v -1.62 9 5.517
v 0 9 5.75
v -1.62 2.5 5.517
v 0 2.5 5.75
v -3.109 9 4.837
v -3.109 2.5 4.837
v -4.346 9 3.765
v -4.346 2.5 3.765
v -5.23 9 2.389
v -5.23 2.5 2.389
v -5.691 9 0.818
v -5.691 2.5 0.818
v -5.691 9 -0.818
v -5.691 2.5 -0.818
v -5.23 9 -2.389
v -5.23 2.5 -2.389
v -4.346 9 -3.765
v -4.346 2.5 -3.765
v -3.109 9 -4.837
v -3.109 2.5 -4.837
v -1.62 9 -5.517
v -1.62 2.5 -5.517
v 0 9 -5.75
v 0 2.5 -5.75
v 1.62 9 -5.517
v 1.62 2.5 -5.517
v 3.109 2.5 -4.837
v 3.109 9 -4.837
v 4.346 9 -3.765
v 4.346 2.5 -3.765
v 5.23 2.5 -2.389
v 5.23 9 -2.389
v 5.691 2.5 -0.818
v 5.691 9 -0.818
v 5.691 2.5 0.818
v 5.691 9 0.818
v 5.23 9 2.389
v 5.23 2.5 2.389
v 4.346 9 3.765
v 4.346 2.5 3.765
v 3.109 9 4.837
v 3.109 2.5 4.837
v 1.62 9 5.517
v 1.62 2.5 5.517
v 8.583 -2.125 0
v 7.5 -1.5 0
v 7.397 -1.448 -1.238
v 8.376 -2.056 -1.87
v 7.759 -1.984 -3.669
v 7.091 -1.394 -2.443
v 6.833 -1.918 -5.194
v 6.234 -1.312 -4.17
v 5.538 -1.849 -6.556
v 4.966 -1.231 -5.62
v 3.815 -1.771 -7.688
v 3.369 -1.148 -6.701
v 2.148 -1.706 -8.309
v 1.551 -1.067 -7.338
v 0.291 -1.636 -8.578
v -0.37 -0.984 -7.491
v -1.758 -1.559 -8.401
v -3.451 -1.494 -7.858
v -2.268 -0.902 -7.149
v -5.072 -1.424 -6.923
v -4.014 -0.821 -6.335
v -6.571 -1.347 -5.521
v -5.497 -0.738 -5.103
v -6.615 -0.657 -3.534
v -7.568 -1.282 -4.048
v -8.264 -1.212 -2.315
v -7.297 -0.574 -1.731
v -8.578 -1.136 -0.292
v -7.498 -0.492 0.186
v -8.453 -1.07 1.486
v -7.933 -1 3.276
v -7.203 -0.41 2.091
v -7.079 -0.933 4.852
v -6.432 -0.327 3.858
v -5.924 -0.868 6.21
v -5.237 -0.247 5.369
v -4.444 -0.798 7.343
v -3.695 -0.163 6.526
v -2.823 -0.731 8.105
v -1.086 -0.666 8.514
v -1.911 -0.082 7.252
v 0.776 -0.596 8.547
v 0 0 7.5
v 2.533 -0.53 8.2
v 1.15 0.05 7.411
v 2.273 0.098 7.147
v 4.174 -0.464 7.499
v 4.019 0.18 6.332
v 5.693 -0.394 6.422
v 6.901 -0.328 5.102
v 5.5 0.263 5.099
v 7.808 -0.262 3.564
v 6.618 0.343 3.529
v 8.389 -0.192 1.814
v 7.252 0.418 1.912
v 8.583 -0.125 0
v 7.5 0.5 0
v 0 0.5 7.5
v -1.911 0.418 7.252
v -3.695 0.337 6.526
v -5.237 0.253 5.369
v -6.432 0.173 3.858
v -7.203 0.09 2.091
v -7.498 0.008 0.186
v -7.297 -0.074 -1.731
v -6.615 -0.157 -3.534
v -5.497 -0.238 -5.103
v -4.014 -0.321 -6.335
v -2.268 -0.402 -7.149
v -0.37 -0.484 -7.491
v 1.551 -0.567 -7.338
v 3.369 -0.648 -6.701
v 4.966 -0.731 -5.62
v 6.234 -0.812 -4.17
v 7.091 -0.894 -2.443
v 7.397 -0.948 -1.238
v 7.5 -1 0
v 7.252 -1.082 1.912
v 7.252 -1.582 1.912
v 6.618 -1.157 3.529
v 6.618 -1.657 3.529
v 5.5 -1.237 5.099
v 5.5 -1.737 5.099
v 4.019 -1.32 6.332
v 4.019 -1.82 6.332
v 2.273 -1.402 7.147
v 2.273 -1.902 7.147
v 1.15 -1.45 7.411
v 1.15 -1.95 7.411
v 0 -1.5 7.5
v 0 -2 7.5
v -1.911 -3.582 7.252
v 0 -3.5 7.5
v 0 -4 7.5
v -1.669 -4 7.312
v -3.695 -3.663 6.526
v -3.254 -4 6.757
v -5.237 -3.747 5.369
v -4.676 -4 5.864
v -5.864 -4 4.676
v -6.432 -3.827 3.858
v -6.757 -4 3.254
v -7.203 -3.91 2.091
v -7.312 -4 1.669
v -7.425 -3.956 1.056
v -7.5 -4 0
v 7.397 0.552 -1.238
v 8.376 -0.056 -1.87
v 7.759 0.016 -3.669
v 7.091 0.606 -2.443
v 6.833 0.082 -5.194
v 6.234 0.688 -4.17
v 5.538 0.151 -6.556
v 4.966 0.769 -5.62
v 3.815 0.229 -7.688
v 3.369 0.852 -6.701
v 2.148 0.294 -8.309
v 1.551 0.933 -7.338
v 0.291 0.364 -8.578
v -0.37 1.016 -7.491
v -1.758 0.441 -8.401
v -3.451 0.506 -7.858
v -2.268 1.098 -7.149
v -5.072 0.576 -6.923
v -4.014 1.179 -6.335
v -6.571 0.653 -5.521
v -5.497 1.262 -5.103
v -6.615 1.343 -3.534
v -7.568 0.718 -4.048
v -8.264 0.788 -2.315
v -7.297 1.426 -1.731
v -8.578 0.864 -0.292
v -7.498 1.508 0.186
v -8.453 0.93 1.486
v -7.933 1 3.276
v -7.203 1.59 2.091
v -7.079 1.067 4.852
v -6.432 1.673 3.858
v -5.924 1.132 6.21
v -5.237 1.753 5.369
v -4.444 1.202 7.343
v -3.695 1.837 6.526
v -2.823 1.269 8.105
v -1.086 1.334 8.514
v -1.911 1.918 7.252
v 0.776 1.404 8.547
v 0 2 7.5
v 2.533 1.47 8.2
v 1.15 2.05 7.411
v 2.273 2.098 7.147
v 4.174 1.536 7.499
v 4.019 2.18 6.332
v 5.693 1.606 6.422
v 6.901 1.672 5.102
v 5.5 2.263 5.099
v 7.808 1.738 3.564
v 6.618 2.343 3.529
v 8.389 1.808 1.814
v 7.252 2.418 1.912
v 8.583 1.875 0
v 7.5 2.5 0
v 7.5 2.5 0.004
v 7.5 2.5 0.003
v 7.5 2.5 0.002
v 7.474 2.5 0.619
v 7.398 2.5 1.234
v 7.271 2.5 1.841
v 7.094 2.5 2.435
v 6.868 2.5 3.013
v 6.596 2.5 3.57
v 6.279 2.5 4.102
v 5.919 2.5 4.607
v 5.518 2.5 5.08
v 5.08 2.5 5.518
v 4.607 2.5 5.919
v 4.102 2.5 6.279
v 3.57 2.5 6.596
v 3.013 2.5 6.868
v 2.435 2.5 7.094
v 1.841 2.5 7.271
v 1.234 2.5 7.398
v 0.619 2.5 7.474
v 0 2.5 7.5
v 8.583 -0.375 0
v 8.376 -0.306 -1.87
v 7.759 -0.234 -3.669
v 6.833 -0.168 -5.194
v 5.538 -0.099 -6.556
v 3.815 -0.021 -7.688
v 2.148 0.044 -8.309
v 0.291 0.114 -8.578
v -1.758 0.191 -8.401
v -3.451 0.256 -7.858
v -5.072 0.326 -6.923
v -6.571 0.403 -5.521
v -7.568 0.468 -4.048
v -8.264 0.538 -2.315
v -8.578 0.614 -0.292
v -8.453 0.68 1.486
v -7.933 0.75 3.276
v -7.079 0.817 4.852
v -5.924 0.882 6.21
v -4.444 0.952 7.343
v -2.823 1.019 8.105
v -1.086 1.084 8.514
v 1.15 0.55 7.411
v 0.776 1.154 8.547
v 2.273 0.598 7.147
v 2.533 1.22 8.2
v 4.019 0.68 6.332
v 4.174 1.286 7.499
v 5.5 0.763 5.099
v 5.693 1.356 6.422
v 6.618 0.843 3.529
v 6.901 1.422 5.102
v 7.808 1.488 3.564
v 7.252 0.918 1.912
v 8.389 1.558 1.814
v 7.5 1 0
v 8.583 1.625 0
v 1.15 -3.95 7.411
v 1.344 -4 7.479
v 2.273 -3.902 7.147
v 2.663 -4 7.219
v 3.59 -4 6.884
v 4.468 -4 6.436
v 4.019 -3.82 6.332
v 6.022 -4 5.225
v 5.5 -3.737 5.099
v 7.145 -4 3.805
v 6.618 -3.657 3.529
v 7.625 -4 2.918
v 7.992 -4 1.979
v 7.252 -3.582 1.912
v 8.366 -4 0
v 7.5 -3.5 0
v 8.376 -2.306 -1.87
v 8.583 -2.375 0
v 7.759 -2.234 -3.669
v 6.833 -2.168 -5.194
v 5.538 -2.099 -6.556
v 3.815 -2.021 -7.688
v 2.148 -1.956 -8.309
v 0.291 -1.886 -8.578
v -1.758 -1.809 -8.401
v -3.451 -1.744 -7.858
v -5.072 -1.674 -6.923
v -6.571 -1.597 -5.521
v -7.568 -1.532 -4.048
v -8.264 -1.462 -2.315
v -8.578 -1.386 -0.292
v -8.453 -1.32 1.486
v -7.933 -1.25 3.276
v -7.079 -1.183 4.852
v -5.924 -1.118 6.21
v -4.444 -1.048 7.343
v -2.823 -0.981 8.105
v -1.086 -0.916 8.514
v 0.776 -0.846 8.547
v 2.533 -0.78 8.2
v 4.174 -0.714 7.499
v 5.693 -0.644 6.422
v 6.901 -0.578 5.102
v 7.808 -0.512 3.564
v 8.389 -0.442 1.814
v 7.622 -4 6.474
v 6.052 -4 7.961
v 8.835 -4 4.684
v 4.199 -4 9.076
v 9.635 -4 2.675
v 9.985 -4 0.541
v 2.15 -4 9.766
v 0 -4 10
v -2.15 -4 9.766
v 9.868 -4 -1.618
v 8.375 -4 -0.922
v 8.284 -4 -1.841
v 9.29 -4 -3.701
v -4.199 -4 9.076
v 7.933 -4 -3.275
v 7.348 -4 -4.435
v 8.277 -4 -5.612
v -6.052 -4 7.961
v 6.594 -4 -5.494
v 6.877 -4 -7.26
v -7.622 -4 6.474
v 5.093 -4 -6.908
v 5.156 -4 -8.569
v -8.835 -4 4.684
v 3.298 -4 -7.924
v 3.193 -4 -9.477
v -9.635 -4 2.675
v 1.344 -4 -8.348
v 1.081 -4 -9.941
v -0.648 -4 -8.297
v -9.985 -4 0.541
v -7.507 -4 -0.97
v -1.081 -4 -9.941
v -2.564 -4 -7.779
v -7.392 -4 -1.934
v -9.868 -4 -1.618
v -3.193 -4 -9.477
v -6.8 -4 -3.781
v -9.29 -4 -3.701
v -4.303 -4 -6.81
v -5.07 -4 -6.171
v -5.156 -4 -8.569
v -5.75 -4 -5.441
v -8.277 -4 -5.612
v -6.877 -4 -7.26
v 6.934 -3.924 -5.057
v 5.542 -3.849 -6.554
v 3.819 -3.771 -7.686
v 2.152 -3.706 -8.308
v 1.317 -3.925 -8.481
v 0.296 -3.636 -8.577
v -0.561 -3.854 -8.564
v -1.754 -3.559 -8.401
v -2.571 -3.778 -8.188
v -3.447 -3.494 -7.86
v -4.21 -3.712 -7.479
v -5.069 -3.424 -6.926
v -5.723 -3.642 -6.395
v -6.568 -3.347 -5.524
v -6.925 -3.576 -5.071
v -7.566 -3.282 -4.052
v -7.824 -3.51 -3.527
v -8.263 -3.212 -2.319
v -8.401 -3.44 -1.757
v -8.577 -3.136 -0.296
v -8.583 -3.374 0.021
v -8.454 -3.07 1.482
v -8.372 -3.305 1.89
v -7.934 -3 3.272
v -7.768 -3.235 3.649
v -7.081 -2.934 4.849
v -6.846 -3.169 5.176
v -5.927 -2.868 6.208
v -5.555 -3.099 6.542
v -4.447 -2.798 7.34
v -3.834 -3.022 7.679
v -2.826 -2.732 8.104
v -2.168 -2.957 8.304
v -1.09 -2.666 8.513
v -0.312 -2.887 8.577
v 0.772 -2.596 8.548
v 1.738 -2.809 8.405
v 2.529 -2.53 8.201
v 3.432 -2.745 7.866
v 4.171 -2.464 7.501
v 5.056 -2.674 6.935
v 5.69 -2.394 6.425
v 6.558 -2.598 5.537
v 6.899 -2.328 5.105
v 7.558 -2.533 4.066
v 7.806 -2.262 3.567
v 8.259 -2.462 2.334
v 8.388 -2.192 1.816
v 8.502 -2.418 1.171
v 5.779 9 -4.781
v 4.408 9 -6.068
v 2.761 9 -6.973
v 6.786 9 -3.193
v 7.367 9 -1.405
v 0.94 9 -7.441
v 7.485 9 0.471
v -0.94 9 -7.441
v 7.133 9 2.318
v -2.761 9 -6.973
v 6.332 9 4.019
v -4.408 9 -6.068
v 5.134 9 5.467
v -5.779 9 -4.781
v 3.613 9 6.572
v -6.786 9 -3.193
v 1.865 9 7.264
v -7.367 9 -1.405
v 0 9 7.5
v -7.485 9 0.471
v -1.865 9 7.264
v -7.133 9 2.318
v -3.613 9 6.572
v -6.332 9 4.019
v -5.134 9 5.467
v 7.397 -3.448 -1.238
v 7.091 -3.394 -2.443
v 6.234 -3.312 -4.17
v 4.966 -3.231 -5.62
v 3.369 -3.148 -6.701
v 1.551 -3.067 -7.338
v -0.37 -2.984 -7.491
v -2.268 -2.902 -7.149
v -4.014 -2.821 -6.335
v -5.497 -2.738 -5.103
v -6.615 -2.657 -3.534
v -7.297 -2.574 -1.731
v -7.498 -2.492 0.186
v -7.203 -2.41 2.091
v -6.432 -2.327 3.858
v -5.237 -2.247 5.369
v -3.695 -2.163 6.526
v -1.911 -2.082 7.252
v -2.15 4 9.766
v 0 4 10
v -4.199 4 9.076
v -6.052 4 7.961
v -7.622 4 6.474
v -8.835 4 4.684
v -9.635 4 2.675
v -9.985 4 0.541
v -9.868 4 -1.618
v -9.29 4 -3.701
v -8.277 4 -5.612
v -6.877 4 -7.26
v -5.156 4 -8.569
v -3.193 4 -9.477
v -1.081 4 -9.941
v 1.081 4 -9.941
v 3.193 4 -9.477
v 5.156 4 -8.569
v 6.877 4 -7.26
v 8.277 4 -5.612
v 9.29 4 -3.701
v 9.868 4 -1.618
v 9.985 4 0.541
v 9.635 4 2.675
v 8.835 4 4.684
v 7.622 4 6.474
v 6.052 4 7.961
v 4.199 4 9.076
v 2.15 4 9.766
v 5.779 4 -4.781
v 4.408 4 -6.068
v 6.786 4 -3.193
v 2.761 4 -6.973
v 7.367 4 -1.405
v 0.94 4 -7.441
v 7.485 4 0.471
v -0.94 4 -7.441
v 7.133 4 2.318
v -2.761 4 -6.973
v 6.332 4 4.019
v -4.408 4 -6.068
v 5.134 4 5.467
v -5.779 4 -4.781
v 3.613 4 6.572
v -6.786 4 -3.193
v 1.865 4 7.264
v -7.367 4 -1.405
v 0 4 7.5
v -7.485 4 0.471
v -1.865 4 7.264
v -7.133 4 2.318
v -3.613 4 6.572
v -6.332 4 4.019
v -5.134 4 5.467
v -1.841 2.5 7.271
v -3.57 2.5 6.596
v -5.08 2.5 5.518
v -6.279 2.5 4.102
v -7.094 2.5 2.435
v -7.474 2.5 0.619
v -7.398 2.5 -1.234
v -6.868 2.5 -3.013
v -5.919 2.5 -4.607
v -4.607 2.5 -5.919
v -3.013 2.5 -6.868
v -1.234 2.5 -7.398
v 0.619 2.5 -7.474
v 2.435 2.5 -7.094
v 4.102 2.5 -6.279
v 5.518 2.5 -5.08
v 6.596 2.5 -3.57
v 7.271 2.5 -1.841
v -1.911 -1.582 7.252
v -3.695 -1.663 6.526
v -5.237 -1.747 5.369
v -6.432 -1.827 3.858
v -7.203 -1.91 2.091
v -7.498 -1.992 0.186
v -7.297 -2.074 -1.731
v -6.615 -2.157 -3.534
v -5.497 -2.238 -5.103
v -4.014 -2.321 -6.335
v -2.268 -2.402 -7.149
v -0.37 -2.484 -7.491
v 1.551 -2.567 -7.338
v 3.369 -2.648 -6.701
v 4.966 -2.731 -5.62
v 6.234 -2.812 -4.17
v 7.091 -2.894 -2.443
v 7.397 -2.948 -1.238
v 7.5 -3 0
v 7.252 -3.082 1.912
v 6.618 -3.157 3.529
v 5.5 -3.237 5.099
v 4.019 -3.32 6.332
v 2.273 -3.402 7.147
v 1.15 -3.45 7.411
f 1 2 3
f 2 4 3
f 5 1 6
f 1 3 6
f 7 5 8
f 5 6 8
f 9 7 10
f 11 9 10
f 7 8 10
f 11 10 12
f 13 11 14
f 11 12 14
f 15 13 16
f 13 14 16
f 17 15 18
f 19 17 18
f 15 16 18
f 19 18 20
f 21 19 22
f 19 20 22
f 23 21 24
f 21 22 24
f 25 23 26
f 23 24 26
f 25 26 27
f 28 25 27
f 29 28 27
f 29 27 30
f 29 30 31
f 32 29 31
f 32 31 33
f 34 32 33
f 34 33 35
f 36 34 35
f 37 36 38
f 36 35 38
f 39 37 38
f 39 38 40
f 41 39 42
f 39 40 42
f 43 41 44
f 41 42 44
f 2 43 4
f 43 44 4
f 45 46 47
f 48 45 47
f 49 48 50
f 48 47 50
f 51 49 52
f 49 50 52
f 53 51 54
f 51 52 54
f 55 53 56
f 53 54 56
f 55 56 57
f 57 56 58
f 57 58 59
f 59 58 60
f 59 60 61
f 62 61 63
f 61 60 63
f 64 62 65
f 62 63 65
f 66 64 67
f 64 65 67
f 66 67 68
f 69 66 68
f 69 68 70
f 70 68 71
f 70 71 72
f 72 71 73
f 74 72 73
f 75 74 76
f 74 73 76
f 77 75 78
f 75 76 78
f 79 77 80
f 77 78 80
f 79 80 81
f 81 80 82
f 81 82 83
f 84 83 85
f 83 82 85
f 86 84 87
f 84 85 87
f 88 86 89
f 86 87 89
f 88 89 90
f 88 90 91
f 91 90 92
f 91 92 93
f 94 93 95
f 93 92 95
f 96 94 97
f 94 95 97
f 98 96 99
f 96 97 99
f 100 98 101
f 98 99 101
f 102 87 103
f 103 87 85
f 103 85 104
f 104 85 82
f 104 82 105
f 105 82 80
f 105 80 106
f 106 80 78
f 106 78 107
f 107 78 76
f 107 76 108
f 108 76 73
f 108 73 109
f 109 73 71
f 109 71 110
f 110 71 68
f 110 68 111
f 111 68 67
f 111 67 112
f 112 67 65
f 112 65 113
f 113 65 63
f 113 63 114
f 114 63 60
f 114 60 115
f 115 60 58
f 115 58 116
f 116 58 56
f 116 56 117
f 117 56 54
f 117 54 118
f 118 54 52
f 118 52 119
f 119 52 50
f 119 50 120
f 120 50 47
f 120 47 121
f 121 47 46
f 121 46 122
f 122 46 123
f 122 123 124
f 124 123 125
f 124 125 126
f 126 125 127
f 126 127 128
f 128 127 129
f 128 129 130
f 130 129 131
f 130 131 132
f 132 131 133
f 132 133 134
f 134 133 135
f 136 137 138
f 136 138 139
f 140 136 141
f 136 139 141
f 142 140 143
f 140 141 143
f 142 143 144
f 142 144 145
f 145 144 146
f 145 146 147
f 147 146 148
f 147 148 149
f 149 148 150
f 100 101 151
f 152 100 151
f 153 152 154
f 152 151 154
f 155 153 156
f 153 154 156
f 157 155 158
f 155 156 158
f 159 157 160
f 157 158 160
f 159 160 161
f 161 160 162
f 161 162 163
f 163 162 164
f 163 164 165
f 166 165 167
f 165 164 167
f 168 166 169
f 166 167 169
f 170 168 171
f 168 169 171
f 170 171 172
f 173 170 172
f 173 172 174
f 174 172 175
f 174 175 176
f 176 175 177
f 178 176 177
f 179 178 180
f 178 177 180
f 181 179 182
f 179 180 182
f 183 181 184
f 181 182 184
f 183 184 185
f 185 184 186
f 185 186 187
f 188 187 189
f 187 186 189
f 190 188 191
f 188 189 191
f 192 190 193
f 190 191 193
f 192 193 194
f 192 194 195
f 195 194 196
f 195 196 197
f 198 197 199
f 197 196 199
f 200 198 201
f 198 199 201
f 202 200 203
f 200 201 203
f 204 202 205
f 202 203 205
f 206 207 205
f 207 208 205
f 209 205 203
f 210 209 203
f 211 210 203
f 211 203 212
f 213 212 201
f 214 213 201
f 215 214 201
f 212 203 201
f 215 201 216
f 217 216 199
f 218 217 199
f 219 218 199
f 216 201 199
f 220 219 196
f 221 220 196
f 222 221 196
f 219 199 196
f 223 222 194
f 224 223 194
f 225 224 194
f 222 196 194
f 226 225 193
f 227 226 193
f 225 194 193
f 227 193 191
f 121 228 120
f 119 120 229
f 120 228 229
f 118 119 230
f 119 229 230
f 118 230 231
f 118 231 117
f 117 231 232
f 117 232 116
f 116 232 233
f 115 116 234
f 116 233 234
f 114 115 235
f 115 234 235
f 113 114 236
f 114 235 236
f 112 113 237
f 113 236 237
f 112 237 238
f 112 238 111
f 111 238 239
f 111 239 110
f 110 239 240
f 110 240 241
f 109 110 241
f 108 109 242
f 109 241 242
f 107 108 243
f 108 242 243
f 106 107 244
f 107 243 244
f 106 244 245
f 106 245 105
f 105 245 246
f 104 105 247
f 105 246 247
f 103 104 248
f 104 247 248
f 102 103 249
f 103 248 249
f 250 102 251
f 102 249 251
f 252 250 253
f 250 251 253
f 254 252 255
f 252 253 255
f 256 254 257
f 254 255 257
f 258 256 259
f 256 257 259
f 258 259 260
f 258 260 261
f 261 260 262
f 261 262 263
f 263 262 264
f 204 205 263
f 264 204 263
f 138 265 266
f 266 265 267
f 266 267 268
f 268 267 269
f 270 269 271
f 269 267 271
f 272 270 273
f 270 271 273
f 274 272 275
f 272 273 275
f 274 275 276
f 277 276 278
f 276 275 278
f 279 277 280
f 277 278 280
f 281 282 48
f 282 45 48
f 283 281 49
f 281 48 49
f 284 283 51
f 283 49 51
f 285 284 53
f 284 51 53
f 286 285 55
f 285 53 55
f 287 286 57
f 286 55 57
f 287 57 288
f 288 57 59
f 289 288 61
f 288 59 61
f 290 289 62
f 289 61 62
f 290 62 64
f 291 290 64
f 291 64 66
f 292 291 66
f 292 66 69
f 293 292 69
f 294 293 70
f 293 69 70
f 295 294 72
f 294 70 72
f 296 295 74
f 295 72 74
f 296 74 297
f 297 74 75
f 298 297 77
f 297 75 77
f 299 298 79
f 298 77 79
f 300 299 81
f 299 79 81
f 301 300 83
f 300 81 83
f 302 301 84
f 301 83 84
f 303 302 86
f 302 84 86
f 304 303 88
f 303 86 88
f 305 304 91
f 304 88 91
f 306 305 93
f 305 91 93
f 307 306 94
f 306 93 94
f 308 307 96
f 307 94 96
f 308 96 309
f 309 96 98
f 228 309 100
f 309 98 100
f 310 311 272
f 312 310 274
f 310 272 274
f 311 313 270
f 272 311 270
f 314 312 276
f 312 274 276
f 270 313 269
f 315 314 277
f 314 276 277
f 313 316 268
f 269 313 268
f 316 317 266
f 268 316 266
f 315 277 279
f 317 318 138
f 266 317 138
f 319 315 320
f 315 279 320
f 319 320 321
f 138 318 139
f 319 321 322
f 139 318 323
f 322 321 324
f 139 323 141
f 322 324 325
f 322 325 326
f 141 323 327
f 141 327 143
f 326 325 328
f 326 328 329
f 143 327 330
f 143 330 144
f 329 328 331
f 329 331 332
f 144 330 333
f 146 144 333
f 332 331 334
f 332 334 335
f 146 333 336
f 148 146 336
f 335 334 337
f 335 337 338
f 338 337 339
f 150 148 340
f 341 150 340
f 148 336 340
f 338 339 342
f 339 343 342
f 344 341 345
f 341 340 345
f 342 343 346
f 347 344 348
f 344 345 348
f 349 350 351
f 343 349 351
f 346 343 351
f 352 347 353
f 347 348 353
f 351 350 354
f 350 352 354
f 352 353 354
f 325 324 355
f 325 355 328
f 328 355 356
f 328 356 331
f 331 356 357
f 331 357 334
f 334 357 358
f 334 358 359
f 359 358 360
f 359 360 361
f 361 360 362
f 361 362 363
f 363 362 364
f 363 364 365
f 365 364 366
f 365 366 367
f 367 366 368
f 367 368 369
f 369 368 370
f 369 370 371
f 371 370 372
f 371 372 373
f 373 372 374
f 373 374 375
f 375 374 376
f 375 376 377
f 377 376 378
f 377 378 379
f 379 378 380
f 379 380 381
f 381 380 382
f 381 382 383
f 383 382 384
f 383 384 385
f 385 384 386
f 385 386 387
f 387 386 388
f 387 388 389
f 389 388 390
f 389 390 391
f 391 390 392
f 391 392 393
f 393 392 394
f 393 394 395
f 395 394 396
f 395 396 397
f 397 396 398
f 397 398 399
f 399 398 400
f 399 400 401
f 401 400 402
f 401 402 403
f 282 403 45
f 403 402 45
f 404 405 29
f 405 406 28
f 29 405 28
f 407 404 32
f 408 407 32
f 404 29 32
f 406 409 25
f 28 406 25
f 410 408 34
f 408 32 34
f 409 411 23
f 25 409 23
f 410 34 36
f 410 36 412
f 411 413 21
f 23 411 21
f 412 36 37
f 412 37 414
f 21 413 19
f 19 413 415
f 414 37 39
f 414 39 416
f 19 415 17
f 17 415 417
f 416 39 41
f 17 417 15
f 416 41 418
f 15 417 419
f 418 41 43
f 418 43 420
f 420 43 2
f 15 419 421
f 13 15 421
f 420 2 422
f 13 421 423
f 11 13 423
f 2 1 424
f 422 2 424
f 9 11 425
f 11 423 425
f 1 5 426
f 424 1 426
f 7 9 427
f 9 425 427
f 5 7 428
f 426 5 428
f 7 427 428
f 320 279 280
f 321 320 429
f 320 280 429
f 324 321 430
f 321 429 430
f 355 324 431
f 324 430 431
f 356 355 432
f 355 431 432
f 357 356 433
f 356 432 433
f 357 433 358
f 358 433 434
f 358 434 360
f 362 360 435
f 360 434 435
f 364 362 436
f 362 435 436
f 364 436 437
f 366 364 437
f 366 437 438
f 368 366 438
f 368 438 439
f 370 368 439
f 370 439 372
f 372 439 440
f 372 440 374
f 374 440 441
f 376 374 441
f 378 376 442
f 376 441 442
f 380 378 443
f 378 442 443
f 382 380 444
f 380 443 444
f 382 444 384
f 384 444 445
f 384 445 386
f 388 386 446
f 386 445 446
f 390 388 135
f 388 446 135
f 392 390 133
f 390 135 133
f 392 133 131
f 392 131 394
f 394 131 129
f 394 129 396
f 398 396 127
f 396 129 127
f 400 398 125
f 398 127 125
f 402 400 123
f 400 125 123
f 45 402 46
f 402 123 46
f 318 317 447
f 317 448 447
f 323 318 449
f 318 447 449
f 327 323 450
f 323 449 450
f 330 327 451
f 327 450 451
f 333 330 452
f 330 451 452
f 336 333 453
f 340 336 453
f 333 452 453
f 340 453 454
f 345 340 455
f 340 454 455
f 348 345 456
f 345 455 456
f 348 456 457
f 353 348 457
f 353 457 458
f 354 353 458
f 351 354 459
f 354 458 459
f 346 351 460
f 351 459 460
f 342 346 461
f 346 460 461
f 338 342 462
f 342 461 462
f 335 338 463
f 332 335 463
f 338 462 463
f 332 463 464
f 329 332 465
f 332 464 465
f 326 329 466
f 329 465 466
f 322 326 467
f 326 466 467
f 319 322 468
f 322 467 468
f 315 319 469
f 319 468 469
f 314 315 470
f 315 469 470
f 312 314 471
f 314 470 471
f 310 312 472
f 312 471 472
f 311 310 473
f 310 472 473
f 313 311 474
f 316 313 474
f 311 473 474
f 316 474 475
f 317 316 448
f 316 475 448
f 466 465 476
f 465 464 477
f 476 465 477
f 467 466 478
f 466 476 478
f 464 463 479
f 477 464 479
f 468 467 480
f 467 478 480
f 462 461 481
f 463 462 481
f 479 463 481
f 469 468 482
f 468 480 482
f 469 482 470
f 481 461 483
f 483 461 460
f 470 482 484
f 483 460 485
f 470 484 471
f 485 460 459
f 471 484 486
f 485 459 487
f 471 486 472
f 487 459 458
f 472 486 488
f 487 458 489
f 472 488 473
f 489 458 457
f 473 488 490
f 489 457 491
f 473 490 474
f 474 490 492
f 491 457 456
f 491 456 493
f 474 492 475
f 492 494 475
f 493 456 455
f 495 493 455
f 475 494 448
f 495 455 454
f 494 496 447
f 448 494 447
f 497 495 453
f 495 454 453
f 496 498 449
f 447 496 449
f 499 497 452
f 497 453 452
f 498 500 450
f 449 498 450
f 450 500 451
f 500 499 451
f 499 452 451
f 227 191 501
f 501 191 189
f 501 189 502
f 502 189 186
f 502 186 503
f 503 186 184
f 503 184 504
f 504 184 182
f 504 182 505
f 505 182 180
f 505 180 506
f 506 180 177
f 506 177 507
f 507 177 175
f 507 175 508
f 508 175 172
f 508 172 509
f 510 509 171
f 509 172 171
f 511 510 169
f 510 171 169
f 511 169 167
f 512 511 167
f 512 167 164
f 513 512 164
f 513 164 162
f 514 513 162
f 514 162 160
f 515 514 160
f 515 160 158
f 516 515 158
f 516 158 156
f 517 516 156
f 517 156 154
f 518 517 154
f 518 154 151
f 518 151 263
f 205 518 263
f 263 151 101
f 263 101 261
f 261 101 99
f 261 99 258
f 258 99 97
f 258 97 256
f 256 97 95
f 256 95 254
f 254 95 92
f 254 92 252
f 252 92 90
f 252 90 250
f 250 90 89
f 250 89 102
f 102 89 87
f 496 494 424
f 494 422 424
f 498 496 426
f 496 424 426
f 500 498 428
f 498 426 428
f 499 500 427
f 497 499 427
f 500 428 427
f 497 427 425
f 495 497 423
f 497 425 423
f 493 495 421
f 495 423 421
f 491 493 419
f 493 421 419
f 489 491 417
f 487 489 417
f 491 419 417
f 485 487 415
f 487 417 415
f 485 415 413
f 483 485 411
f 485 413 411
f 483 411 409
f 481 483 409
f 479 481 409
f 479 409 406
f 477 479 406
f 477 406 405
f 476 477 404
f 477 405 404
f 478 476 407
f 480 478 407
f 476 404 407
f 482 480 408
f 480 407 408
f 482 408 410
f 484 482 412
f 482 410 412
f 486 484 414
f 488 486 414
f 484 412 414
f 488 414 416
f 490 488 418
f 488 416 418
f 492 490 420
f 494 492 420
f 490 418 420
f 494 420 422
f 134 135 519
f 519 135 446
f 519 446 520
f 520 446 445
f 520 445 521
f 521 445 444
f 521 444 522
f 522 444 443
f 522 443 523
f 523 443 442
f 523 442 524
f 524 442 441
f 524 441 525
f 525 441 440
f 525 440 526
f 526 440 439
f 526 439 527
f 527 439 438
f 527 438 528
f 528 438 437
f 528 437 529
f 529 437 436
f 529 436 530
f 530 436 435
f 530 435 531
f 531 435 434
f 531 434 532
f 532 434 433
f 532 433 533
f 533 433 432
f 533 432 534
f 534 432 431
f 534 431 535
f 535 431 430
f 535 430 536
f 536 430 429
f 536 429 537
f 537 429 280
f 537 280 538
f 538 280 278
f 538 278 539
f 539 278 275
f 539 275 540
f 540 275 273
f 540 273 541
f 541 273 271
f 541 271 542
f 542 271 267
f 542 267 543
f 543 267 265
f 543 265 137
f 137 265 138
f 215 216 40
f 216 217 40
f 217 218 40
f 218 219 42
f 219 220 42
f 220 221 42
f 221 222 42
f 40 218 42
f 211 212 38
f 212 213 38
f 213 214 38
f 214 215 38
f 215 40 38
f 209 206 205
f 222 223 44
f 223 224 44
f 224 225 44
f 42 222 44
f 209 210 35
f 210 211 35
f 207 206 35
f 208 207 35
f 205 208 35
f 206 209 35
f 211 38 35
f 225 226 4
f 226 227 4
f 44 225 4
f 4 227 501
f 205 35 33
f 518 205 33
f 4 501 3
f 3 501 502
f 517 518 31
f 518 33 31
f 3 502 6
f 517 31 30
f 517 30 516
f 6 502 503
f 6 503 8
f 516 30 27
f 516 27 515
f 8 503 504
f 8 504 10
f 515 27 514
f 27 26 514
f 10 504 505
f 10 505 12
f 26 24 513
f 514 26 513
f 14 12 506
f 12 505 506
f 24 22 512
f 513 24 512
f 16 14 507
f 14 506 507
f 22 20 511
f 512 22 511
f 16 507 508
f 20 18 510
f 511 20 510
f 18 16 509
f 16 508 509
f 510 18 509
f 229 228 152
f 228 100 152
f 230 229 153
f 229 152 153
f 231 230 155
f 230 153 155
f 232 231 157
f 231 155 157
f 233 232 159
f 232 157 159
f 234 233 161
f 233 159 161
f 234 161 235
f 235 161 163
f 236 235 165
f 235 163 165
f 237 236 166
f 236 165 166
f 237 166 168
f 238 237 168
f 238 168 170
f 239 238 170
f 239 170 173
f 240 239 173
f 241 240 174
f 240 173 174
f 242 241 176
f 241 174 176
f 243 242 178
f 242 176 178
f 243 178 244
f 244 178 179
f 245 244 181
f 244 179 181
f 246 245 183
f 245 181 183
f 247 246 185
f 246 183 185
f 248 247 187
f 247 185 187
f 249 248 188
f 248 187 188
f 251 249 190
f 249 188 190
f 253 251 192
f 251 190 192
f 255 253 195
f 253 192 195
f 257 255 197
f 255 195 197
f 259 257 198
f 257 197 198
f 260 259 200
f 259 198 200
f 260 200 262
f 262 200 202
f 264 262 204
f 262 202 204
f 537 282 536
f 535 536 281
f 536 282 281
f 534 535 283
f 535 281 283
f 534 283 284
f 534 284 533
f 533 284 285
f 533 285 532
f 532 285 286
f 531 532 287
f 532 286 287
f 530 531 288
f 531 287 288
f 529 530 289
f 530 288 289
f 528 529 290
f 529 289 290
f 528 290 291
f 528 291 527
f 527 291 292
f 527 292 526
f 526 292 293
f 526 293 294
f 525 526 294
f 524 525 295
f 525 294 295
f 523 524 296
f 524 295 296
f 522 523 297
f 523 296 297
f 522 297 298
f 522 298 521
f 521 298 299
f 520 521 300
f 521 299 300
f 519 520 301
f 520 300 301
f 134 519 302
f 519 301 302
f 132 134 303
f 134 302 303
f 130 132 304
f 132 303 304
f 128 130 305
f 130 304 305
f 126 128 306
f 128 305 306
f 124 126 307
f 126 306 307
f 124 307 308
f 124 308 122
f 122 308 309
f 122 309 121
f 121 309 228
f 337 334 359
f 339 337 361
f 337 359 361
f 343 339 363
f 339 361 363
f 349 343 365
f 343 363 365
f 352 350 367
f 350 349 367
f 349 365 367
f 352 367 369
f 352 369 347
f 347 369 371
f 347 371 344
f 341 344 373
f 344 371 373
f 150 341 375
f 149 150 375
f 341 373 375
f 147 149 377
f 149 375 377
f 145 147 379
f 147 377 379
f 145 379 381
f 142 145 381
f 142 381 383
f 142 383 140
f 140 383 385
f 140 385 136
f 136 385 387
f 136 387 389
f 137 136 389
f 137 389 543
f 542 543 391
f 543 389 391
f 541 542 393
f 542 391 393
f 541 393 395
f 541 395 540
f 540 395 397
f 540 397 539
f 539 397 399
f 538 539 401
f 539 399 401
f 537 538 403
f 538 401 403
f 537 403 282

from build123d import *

# Parameters (mm, degrees)
THREAD1_PITCH = 2


with BuildPart() as part:
    # Sketch1 → Revolve1 (revolve)
    with BuildSketch(Plane(origin=(0, 0, 0), x_dir=(0, 0, -1), z_dir=(1, 0, 0))):
        Polygon((-7.5, 2.5), (-7.5, -4), (-10, -4), (-10, 4), (-7.5, 4), (-7.5, 9), (-5.75, 9), (-5.75, 2.5), align=None)
    revolve(axis=Axis((0, 15.090909091, 0), (0, -1, 0)))

    # Thread1: the profile of Thread Profile1 profile screwed along a right-hand helix of 5 turns, 10 arcs to a turn; built about Z, then put on its axis
    thread1_z = Axis((0, 0, 0), (0, 0, 1))
    thread1_corners = [(7.4997, 0, -0.000173205), (8.58253175, 0, 0.624999997), (8.58253175, 0, 0.874999997), (7.4997, 0, 1.5001732)]
    with BuildLine(mode=Mode.PRIVATE) as thread1_profile:
        Line(thread1_corners[0], thread1_corners[1])
        Line(thread1_corners[1], thread1_corners[2])
        Line(thread1_corners[2], thread1_corners[3])
        Line(thread1_corners[3], thread1_corners[0])
    thread1_cap = Face(thread1_profile.wire())
    thread1_turn_angles = [0, 18, 36, 54, 72, 90, 108, 126, 144, 162, 180, 198, 216, 234, 252, 270, 288, 306, 324, 342, 360]
    thread1_turn_weights = [1, 0.9510565162951535, 1, 0.9510565162951535, 1, 0.9510565162951535, 1, 0.9510565162951535, 1, 0.9510565162951535, 1, 0.9510565162951535, 1, 0.9510565162951535, 1, 0.9510565162951535, 1, 0.9510565162951535, 1, 0.9510565162951535, 1]
    thread1_turn_rails = [Edge.make_bspline([Vector(p[0], p[1], 0).rotate(thread1_z, thread1_turn_angles[k]) / thread1_turn_weights[k] + Vector(0, 0, p[2] + THREAD1_PITCH * thread1_turn_angles[k] / 360) for k in range(21)], [0, 0, 0, 1, 1, 2, 2, 3, 3, 4, 4, 5, 5, 6, 6, 7, 7, 8, 8, 9, 9, 10, 10, 10], 2, thread1_turn_weights) for p in thread1_corners]
    thread1_turn_sides = [Face.make_surface_from_curves(thread1_turn_rails[p[0]], thread1_turn_rails[p[1]]) for p in [(0, 1), (1, 2), (2, 3), (3, 0)]]
    thread1 = Plane(origin=(0, -9, 0), x_dir=(1, 0, 0), z_dir=(0, 1, 0)) * Solid(Shell([*[p.moved(Location((0, 0, THREAD1_PITCH * i))) for i in range(5) for p in thread1_turn_sides], thread1_cap, thread1_cap.rotate(thread1_z, 1800).moved(Location((0, 0, THREAD1_PITCH * 1800 / 360)))]))
    add(thread1, mode=Mode.SUBTRACT)


solid = part.part
